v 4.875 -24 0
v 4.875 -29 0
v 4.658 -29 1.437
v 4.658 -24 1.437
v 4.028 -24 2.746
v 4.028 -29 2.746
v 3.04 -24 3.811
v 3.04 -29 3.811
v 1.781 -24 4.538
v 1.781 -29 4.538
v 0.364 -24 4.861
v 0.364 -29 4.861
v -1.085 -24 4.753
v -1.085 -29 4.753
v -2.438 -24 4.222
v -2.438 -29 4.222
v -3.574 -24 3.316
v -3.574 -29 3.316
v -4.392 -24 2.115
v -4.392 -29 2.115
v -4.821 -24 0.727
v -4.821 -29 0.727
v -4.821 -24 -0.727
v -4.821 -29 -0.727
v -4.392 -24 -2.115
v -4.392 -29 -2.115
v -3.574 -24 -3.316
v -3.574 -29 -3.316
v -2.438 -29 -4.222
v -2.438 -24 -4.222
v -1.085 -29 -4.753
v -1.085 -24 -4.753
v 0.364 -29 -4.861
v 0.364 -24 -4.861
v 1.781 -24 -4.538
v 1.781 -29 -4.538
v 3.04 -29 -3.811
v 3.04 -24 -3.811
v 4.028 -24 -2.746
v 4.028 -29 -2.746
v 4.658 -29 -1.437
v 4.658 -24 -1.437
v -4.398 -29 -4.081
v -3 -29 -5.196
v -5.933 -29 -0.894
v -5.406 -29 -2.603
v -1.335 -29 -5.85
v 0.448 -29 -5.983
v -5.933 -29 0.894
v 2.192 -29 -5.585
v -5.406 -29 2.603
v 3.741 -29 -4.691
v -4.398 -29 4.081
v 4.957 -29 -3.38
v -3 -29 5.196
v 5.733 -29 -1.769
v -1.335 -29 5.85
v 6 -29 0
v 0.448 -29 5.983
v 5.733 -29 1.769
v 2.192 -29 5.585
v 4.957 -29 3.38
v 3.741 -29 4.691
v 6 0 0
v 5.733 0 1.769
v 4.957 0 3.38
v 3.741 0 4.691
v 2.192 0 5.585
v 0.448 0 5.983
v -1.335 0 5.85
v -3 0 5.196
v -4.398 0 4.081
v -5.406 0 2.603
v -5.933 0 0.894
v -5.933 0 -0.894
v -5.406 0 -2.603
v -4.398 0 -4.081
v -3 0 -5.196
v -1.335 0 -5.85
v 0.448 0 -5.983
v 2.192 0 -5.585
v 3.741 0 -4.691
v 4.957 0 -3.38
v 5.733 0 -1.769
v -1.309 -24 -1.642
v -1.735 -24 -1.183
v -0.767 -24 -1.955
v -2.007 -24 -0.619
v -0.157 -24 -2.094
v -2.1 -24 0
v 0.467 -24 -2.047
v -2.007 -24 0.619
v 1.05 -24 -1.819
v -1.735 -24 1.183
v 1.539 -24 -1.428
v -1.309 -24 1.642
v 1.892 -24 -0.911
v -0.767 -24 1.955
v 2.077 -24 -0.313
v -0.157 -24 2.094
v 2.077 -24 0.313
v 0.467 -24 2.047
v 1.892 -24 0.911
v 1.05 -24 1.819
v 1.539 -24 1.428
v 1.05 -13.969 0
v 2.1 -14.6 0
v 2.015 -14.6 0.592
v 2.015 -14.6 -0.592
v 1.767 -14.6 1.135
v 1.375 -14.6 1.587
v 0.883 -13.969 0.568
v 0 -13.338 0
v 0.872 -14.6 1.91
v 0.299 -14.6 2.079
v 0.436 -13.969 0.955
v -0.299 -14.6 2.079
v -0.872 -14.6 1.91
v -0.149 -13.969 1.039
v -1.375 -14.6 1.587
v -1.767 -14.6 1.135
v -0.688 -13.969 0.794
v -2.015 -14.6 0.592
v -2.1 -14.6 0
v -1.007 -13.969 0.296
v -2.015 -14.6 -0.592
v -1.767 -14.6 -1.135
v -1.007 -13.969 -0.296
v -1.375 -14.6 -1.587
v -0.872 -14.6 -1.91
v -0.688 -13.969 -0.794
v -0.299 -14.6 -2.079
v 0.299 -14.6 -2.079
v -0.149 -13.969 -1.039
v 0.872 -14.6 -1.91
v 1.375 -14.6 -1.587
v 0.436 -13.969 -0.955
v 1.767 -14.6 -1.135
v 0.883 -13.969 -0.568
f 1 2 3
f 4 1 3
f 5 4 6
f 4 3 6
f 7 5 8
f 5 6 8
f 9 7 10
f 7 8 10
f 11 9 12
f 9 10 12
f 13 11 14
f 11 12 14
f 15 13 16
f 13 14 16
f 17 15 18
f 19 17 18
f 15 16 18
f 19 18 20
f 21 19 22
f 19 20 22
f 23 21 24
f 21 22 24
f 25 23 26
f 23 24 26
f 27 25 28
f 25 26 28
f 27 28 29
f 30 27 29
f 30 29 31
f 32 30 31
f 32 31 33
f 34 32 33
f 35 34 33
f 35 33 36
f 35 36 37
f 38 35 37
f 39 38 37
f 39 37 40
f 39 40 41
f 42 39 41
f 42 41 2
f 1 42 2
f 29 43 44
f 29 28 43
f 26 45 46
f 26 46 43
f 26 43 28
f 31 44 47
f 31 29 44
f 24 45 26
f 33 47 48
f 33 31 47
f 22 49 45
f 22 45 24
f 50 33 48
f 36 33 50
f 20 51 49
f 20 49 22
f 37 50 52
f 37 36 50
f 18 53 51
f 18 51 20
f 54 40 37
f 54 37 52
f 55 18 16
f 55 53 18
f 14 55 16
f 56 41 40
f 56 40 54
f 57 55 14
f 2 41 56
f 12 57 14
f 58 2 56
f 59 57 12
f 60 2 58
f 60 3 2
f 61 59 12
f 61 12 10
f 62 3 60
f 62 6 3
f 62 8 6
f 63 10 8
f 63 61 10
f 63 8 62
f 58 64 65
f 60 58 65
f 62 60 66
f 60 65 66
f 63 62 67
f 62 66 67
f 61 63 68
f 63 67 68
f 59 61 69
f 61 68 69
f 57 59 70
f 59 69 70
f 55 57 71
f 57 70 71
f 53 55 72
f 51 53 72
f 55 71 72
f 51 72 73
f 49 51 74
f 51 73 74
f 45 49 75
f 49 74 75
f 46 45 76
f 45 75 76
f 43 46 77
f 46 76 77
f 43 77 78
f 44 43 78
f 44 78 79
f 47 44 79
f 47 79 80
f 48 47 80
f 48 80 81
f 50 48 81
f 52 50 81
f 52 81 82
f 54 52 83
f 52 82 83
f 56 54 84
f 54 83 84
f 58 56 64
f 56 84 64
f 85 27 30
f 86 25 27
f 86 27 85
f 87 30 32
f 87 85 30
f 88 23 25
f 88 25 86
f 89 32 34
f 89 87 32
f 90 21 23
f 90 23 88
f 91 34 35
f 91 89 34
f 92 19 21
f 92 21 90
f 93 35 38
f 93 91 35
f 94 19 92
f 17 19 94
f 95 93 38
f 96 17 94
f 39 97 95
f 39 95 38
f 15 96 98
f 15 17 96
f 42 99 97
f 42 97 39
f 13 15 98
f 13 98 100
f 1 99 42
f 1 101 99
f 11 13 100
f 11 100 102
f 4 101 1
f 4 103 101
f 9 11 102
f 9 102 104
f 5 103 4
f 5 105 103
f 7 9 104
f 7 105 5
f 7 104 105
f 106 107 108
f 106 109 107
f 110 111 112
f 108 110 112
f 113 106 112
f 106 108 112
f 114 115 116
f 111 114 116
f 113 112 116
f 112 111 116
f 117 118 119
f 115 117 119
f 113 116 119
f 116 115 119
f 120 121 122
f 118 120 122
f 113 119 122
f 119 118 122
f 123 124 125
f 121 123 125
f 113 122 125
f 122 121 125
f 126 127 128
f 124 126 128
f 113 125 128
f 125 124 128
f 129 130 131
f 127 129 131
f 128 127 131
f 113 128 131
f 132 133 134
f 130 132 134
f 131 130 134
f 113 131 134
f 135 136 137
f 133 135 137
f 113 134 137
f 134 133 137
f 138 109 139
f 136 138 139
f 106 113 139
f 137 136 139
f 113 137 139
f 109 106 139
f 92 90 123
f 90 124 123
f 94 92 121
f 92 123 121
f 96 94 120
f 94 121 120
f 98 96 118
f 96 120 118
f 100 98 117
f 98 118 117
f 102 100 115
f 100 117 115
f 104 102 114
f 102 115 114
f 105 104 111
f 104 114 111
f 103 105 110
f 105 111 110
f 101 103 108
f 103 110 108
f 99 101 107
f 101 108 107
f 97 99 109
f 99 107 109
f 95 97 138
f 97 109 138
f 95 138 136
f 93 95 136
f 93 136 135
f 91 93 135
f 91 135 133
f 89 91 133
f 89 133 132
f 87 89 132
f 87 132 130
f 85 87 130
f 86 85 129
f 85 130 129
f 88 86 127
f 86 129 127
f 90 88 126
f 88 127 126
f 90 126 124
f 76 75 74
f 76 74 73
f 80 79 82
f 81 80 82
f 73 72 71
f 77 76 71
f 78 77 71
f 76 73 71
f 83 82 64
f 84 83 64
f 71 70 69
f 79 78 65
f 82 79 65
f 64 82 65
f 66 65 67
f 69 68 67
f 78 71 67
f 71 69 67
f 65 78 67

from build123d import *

# Parameters (mm, degrees)
F0_R           = 6
F1_DEPTH       = 29
F3_D           = 4.2
F3_DEPTH       = 14.4
F3_CBORE_D     = 9.75
F3_CBORE_DEPTH = 5
F3_TIP         = 1.2618073


with BuildPart() as f1:
    # F0 (on Front) → F1 (new body)
    with BuildSketch(Plane.XZ):
        Circle(F0_R)
    extrude(amount=F1_DEPTH)

    # F3
    with Locations(Plane.XZ.offset(29)):
        with Locations((0, 0)):
            CounterBoreHole(F3_D / 2, F3_CBORE_D / 2, F3_CBORE_DEPTH, depth=F3_DEPTH)
            with Locations((0, 0, -(F3_DEPTH + F3_TIP / 2))):  # 118° drill point
                Cone(0, F3_D / 2, F3_TIP, mode=Mode.SUBTRACT)


solid = f1.part
